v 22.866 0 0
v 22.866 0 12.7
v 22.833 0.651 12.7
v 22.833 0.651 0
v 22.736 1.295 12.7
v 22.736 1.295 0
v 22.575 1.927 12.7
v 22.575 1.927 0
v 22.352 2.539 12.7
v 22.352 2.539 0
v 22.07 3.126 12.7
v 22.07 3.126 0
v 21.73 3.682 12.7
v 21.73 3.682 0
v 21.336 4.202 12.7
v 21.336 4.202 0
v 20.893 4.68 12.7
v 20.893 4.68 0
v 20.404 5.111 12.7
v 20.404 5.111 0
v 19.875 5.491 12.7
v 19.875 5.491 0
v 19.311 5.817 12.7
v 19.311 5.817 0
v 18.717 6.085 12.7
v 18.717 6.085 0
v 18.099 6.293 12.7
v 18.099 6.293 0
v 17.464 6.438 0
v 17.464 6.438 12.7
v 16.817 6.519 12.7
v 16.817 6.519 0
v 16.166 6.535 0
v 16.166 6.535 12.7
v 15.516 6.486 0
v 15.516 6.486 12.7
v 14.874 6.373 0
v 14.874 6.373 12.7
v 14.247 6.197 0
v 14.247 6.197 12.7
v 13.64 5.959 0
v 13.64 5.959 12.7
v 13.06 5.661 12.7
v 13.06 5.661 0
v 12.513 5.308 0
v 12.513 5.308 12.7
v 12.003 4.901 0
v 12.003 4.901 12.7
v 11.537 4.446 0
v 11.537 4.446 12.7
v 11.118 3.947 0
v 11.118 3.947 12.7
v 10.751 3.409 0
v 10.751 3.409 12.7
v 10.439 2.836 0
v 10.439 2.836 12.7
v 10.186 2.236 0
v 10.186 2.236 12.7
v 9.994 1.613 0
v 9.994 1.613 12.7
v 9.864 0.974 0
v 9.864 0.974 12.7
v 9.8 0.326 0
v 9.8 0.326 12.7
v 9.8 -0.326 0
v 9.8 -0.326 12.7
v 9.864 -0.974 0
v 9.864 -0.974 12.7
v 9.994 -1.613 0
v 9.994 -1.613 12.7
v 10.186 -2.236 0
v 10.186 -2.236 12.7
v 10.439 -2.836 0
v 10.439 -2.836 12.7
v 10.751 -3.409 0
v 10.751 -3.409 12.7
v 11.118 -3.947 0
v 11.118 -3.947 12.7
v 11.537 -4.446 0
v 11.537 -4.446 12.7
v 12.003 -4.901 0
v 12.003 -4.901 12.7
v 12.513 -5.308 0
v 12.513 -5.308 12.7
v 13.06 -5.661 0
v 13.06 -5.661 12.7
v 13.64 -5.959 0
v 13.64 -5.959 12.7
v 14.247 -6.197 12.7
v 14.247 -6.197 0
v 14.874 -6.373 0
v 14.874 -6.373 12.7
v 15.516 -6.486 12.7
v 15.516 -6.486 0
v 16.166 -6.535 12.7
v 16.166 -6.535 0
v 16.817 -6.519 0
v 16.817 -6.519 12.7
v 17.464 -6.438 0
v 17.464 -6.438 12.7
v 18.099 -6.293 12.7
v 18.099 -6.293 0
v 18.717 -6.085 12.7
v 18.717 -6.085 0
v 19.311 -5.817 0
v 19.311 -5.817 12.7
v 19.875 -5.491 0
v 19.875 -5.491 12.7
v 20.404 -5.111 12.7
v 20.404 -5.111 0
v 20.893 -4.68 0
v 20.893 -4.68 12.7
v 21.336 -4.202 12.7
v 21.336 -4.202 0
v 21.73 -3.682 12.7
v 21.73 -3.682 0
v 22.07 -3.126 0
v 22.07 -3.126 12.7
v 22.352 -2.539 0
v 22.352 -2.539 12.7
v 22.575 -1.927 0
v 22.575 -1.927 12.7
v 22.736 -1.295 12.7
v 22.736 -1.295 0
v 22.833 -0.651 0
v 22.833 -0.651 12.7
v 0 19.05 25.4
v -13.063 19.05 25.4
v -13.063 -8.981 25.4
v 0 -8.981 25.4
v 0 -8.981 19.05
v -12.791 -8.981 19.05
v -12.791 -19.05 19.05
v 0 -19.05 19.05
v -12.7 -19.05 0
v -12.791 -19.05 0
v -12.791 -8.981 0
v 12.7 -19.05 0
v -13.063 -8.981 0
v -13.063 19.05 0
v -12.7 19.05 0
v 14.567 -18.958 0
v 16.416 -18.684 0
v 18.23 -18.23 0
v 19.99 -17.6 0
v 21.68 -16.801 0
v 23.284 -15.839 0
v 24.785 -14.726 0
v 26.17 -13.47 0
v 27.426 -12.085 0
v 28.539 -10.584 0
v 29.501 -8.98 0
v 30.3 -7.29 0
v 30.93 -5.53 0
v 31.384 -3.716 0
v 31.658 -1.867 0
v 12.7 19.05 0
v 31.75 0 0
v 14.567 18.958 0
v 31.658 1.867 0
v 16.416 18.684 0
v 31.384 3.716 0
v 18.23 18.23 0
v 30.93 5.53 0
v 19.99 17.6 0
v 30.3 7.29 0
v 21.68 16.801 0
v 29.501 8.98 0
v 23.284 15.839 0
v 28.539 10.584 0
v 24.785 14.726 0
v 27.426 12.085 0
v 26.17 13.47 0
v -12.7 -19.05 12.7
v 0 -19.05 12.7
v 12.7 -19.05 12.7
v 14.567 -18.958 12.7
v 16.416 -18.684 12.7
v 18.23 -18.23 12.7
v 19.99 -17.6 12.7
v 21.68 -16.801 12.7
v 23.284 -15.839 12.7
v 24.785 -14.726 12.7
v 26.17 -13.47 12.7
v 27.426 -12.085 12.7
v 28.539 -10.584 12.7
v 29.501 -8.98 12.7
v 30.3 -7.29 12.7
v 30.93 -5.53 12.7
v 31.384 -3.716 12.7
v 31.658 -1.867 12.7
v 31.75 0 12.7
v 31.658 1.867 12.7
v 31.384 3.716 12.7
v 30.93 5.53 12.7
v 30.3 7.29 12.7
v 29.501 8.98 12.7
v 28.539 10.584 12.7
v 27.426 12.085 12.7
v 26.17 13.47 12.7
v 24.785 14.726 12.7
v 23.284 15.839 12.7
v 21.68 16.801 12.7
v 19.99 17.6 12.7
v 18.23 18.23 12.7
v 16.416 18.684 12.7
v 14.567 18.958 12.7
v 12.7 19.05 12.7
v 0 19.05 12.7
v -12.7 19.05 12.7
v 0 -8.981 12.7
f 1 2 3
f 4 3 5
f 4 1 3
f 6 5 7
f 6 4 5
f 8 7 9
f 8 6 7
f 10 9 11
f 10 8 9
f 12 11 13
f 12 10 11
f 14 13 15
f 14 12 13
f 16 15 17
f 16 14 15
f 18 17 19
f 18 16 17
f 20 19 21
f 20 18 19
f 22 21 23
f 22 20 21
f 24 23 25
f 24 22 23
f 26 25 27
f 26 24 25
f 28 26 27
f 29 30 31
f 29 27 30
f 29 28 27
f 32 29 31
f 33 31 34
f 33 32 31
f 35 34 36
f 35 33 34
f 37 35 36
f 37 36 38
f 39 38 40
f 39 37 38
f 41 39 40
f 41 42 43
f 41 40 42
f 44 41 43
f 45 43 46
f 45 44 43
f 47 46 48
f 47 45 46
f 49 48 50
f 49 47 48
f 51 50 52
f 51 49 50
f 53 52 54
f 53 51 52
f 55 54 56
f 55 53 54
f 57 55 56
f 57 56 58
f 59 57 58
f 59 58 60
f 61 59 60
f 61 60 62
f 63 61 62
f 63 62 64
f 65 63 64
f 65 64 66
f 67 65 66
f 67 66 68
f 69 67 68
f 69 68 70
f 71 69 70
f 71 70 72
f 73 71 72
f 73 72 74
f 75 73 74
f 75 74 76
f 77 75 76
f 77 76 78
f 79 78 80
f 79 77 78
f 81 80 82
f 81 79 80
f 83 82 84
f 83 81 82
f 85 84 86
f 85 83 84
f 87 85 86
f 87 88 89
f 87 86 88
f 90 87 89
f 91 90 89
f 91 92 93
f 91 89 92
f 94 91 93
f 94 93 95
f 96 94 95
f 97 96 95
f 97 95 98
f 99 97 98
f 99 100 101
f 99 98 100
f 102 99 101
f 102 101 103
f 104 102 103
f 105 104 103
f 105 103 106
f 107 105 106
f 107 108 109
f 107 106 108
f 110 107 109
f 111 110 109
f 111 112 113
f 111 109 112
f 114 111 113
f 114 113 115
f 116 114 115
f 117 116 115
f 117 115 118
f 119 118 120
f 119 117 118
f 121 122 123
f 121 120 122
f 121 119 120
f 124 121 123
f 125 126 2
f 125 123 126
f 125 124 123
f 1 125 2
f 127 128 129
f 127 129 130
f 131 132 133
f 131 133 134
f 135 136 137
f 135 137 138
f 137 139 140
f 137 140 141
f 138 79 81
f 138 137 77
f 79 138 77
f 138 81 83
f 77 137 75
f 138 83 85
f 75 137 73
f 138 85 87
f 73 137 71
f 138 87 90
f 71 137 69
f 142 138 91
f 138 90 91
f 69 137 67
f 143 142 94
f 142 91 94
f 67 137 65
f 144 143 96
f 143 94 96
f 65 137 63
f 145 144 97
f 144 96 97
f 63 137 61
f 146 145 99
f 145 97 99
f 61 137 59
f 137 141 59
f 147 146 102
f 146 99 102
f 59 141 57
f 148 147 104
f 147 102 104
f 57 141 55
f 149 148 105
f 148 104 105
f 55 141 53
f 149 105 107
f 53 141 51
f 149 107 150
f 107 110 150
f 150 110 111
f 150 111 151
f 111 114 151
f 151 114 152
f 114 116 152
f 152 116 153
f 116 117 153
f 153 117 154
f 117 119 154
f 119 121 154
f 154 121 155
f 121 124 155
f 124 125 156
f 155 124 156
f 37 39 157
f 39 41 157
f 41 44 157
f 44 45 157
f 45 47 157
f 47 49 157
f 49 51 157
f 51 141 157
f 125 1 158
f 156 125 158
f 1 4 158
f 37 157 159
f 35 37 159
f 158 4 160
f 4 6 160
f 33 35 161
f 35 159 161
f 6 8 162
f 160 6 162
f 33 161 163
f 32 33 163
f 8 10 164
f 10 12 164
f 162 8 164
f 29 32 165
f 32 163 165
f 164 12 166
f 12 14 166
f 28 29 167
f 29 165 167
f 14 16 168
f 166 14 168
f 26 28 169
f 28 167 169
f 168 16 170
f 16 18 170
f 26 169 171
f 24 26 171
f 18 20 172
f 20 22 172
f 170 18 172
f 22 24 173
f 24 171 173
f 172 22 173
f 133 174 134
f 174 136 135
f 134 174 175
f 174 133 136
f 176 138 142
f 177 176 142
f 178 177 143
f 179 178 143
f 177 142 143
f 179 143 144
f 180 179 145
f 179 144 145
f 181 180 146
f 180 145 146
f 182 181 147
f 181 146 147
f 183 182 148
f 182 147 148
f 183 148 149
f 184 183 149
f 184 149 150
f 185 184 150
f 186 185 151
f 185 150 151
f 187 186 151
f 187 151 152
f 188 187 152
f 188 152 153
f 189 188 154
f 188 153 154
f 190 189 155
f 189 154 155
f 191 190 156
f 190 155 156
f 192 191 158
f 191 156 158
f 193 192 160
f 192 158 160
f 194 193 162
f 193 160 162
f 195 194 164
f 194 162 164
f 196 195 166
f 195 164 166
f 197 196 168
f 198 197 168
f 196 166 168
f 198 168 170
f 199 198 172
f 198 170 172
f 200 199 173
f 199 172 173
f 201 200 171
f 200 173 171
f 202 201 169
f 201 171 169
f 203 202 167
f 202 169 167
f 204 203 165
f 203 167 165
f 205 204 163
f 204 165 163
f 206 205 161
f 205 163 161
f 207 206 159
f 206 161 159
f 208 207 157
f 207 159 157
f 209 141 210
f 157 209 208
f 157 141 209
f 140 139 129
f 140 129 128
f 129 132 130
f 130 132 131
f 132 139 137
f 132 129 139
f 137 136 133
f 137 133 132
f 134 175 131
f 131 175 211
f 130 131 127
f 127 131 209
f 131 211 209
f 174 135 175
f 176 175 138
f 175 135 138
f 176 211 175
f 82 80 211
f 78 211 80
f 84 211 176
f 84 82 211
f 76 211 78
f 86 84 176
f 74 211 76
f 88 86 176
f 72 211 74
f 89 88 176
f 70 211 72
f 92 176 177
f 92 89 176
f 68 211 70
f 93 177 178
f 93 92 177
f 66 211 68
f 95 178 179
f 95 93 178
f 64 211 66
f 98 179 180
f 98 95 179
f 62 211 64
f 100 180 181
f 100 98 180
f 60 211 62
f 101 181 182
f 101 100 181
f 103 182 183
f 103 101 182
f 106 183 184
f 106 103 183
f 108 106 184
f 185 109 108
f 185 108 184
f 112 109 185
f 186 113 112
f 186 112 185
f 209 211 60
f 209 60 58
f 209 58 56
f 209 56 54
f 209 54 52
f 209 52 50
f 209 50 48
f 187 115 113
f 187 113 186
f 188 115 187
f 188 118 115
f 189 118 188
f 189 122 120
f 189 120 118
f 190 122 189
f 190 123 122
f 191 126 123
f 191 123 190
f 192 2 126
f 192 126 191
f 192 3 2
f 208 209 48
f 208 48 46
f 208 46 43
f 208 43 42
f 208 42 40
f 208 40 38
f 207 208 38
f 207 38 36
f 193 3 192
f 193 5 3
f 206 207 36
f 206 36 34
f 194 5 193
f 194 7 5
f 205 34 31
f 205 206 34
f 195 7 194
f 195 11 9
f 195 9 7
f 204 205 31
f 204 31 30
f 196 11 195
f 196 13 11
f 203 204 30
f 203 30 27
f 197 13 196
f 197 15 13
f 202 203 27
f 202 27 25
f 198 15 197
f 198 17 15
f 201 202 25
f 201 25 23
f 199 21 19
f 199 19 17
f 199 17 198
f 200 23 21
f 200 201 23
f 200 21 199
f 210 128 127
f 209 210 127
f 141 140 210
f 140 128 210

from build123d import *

# Parameters (mm, degrees)
F0_W     = 25.4
F0_H     = 38.1
F1_DEPTH = 12.7
F2_R     = 6.5370938685
F3_DEPTH = 12.701
F4_W     = 12.7907153219
F4_H     = 10.0692855194
F5_DEPTH = 19.05
F6_W     = 13.0628570914
F6_H     = 28.0307149515
F7_DEPTH = 25.4


with BuildPart() as f1:
    # F0 (on Top) → F1 (new body)
    with BuildSketch(Plane.XY):
        Rectangle(F0_W, F0_H)
        with BuildLine():
            ThreePointArc((12.7, -19.05), (31.75, 0), (12.7, 19.05))
            Line((12.7, 19.05), (12.7, -19.05))
        make_face()
    extrude(amount=F1_DEPTH)

    # F2 (on Top) → F3 (cut, through all)
    with BuildSketch(Plane.XY):
        with Locations((16.3285713643, 0)):
            Circle(F2_R)
    extrude(amount=F3_DEPTH, mode=Mode.SUBTRACT)

    # F4 (on Top) → F5 (join)
    with BuildSketch(Plane.XY):
        with Locations((-6.3953576609, -14.0153574757)):
            Rectangle(F4_W, F4_H)
    extrude(amount=F5_DEPTH)

    # F6 (on Top) → F7 (join)
    with BuildSketch(Plane.XY):
        with Locations((-6.5314285457, 5.0346427597)):
            Rectangle(F6_W, F6_H)
    extrude(amount=F7_DEPTH)


solid = f1.part
